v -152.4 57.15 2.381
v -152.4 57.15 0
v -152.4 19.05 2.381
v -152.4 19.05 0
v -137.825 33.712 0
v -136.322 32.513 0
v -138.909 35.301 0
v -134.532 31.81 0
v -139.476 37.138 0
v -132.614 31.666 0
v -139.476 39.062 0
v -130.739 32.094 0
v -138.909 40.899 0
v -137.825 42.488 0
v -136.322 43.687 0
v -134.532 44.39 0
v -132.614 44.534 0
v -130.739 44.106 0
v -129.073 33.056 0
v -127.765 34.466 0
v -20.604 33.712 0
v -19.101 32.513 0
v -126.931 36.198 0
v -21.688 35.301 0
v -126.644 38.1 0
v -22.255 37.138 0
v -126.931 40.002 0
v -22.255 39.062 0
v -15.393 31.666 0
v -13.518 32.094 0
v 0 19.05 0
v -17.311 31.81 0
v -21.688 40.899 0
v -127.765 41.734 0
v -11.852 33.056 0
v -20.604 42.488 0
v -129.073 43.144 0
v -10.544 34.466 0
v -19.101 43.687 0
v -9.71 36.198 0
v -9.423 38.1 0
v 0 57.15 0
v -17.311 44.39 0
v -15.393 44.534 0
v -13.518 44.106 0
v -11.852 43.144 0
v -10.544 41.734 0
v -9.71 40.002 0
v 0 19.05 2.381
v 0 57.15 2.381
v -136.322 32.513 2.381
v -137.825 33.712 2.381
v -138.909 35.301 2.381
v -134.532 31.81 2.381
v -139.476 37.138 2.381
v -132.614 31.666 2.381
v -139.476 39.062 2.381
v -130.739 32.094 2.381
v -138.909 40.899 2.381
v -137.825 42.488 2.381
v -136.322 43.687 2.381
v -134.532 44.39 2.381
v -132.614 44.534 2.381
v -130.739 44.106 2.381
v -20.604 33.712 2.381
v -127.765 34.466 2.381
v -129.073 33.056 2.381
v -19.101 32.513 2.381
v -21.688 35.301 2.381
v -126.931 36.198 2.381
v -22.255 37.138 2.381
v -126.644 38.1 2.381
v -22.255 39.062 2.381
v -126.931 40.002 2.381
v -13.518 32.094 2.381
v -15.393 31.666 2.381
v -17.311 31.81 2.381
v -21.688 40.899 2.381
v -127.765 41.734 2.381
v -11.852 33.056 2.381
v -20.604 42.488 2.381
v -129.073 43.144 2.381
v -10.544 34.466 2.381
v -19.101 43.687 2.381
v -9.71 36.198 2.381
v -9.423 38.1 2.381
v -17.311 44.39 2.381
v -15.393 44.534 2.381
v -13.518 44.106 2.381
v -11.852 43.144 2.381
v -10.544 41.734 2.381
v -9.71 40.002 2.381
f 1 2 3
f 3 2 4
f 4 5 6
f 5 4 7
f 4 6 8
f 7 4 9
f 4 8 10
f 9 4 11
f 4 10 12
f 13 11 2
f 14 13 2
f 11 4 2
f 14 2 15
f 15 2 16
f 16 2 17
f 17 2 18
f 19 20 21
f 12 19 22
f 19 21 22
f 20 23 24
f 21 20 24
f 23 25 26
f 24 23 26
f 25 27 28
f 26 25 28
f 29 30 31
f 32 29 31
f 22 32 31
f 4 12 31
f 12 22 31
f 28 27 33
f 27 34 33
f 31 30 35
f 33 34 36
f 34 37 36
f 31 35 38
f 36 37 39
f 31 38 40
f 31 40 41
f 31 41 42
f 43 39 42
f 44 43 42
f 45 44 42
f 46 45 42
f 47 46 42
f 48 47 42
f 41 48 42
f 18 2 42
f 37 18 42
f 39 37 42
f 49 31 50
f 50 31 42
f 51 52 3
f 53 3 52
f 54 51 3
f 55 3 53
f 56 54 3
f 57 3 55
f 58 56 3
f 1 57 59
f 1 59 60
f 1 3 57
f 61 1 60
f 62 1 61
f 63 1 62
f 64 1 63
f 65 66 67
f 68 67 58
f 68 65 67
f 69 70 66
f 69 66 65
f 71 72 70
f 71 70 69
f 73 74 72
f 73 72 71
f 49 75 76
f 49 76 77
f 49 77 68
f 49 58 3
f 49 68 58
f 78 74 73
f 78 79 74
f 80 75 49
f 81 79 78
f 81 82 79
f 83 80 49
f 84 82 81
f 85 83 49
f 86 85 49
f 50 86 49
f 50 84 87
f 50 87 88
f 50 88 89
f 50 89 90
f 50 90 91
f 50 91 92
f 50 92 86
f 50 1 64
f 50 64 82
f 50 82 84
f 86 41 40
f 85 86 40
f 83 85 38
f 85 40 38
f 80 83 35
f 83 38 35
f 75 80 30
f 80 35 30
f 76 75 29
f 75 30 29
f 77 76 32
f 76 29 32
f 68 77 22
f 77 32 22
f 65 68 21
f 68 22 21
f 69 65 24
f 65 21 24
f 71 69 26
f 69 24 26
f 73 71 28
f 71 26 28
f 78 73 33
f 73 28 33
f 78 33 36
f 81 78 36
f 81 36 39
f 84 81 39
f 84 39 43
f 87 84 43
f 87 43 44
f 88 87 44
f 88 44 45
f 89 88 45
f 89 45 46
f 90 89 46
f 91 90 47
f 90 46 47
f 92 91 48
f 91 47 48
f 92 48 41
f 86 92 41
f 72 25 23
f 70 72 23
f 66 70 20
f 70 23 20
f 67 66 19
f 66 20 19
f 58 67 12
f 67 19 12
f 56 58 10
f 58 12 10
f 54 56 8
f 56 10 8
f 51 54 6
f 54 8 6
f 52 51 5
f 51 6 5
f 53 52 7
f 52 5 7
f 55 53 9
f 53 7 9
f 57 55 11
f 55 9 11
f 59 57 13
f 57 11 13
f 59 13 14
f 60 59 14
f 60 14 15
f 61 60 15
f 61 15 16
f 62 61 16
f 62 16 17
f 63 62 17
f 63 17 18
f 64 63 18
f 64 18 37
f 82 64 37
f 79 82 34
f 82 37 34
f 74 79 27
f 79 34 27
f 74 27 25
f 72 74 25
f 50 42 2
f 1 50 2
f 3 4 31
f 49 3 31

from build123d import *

# Parameters (mm, degrees)
F1_DEPTH = 2.38125


# Not quite as in the source:
# - a feature names something its author has since deleted; it is built from what else it names


with BuildPart() as f1:
    # F0 (on Top) → F1 (new body)
    with BuildSketch(Plane.XY):
        with BuildLine():
            Line((-9.4234, 38.1), (0, 38.1))
            Line((0, 38.1), (0, 57.15))
            Line((0, 57.15), (-152.4, 57.15))
            Line((-152.4, 57.15), (-152.4, 38.1))
            Line((-152.4, 38.1), (-139.5476, 38.1))
            ThreePointArc((-139.5476, 38.1), (-133.096, 44.5516), (-126.6444, 38.1))
            Line((-126.6444, 38.1), (-22.3266, 38.1))
            ThreePointArc((-22.3266, 38.1), (-15.875, 44.5516), (-9.4234, 38.1))
        make_face()
        with BuildLine():
            Line((-152.4, 19.05), (0, 19.05))
            Line((0, 19.05), (0, 38.1))
            Line((0, 38.1), (-9.4234, 38.1))
            ThreePointArc((-9.4234, 38.1), (-15.875, 31.6484), (-22.3266, 38.1))
            Line((-22.3266, 38.1), (-126.6444, 38.1))
            ThreePointArc((-126.6444, 38.1), (-133.096, 31.6484), (-139.5476, 38.1))
            Line((-139.5476, 38.1), (-152.4, 38.1))
            Line((-152.4, 38.1), (-152.4, 19.05))
        make_face()
    extrude(amount=F1_DEPTH)


solid = f1.part
